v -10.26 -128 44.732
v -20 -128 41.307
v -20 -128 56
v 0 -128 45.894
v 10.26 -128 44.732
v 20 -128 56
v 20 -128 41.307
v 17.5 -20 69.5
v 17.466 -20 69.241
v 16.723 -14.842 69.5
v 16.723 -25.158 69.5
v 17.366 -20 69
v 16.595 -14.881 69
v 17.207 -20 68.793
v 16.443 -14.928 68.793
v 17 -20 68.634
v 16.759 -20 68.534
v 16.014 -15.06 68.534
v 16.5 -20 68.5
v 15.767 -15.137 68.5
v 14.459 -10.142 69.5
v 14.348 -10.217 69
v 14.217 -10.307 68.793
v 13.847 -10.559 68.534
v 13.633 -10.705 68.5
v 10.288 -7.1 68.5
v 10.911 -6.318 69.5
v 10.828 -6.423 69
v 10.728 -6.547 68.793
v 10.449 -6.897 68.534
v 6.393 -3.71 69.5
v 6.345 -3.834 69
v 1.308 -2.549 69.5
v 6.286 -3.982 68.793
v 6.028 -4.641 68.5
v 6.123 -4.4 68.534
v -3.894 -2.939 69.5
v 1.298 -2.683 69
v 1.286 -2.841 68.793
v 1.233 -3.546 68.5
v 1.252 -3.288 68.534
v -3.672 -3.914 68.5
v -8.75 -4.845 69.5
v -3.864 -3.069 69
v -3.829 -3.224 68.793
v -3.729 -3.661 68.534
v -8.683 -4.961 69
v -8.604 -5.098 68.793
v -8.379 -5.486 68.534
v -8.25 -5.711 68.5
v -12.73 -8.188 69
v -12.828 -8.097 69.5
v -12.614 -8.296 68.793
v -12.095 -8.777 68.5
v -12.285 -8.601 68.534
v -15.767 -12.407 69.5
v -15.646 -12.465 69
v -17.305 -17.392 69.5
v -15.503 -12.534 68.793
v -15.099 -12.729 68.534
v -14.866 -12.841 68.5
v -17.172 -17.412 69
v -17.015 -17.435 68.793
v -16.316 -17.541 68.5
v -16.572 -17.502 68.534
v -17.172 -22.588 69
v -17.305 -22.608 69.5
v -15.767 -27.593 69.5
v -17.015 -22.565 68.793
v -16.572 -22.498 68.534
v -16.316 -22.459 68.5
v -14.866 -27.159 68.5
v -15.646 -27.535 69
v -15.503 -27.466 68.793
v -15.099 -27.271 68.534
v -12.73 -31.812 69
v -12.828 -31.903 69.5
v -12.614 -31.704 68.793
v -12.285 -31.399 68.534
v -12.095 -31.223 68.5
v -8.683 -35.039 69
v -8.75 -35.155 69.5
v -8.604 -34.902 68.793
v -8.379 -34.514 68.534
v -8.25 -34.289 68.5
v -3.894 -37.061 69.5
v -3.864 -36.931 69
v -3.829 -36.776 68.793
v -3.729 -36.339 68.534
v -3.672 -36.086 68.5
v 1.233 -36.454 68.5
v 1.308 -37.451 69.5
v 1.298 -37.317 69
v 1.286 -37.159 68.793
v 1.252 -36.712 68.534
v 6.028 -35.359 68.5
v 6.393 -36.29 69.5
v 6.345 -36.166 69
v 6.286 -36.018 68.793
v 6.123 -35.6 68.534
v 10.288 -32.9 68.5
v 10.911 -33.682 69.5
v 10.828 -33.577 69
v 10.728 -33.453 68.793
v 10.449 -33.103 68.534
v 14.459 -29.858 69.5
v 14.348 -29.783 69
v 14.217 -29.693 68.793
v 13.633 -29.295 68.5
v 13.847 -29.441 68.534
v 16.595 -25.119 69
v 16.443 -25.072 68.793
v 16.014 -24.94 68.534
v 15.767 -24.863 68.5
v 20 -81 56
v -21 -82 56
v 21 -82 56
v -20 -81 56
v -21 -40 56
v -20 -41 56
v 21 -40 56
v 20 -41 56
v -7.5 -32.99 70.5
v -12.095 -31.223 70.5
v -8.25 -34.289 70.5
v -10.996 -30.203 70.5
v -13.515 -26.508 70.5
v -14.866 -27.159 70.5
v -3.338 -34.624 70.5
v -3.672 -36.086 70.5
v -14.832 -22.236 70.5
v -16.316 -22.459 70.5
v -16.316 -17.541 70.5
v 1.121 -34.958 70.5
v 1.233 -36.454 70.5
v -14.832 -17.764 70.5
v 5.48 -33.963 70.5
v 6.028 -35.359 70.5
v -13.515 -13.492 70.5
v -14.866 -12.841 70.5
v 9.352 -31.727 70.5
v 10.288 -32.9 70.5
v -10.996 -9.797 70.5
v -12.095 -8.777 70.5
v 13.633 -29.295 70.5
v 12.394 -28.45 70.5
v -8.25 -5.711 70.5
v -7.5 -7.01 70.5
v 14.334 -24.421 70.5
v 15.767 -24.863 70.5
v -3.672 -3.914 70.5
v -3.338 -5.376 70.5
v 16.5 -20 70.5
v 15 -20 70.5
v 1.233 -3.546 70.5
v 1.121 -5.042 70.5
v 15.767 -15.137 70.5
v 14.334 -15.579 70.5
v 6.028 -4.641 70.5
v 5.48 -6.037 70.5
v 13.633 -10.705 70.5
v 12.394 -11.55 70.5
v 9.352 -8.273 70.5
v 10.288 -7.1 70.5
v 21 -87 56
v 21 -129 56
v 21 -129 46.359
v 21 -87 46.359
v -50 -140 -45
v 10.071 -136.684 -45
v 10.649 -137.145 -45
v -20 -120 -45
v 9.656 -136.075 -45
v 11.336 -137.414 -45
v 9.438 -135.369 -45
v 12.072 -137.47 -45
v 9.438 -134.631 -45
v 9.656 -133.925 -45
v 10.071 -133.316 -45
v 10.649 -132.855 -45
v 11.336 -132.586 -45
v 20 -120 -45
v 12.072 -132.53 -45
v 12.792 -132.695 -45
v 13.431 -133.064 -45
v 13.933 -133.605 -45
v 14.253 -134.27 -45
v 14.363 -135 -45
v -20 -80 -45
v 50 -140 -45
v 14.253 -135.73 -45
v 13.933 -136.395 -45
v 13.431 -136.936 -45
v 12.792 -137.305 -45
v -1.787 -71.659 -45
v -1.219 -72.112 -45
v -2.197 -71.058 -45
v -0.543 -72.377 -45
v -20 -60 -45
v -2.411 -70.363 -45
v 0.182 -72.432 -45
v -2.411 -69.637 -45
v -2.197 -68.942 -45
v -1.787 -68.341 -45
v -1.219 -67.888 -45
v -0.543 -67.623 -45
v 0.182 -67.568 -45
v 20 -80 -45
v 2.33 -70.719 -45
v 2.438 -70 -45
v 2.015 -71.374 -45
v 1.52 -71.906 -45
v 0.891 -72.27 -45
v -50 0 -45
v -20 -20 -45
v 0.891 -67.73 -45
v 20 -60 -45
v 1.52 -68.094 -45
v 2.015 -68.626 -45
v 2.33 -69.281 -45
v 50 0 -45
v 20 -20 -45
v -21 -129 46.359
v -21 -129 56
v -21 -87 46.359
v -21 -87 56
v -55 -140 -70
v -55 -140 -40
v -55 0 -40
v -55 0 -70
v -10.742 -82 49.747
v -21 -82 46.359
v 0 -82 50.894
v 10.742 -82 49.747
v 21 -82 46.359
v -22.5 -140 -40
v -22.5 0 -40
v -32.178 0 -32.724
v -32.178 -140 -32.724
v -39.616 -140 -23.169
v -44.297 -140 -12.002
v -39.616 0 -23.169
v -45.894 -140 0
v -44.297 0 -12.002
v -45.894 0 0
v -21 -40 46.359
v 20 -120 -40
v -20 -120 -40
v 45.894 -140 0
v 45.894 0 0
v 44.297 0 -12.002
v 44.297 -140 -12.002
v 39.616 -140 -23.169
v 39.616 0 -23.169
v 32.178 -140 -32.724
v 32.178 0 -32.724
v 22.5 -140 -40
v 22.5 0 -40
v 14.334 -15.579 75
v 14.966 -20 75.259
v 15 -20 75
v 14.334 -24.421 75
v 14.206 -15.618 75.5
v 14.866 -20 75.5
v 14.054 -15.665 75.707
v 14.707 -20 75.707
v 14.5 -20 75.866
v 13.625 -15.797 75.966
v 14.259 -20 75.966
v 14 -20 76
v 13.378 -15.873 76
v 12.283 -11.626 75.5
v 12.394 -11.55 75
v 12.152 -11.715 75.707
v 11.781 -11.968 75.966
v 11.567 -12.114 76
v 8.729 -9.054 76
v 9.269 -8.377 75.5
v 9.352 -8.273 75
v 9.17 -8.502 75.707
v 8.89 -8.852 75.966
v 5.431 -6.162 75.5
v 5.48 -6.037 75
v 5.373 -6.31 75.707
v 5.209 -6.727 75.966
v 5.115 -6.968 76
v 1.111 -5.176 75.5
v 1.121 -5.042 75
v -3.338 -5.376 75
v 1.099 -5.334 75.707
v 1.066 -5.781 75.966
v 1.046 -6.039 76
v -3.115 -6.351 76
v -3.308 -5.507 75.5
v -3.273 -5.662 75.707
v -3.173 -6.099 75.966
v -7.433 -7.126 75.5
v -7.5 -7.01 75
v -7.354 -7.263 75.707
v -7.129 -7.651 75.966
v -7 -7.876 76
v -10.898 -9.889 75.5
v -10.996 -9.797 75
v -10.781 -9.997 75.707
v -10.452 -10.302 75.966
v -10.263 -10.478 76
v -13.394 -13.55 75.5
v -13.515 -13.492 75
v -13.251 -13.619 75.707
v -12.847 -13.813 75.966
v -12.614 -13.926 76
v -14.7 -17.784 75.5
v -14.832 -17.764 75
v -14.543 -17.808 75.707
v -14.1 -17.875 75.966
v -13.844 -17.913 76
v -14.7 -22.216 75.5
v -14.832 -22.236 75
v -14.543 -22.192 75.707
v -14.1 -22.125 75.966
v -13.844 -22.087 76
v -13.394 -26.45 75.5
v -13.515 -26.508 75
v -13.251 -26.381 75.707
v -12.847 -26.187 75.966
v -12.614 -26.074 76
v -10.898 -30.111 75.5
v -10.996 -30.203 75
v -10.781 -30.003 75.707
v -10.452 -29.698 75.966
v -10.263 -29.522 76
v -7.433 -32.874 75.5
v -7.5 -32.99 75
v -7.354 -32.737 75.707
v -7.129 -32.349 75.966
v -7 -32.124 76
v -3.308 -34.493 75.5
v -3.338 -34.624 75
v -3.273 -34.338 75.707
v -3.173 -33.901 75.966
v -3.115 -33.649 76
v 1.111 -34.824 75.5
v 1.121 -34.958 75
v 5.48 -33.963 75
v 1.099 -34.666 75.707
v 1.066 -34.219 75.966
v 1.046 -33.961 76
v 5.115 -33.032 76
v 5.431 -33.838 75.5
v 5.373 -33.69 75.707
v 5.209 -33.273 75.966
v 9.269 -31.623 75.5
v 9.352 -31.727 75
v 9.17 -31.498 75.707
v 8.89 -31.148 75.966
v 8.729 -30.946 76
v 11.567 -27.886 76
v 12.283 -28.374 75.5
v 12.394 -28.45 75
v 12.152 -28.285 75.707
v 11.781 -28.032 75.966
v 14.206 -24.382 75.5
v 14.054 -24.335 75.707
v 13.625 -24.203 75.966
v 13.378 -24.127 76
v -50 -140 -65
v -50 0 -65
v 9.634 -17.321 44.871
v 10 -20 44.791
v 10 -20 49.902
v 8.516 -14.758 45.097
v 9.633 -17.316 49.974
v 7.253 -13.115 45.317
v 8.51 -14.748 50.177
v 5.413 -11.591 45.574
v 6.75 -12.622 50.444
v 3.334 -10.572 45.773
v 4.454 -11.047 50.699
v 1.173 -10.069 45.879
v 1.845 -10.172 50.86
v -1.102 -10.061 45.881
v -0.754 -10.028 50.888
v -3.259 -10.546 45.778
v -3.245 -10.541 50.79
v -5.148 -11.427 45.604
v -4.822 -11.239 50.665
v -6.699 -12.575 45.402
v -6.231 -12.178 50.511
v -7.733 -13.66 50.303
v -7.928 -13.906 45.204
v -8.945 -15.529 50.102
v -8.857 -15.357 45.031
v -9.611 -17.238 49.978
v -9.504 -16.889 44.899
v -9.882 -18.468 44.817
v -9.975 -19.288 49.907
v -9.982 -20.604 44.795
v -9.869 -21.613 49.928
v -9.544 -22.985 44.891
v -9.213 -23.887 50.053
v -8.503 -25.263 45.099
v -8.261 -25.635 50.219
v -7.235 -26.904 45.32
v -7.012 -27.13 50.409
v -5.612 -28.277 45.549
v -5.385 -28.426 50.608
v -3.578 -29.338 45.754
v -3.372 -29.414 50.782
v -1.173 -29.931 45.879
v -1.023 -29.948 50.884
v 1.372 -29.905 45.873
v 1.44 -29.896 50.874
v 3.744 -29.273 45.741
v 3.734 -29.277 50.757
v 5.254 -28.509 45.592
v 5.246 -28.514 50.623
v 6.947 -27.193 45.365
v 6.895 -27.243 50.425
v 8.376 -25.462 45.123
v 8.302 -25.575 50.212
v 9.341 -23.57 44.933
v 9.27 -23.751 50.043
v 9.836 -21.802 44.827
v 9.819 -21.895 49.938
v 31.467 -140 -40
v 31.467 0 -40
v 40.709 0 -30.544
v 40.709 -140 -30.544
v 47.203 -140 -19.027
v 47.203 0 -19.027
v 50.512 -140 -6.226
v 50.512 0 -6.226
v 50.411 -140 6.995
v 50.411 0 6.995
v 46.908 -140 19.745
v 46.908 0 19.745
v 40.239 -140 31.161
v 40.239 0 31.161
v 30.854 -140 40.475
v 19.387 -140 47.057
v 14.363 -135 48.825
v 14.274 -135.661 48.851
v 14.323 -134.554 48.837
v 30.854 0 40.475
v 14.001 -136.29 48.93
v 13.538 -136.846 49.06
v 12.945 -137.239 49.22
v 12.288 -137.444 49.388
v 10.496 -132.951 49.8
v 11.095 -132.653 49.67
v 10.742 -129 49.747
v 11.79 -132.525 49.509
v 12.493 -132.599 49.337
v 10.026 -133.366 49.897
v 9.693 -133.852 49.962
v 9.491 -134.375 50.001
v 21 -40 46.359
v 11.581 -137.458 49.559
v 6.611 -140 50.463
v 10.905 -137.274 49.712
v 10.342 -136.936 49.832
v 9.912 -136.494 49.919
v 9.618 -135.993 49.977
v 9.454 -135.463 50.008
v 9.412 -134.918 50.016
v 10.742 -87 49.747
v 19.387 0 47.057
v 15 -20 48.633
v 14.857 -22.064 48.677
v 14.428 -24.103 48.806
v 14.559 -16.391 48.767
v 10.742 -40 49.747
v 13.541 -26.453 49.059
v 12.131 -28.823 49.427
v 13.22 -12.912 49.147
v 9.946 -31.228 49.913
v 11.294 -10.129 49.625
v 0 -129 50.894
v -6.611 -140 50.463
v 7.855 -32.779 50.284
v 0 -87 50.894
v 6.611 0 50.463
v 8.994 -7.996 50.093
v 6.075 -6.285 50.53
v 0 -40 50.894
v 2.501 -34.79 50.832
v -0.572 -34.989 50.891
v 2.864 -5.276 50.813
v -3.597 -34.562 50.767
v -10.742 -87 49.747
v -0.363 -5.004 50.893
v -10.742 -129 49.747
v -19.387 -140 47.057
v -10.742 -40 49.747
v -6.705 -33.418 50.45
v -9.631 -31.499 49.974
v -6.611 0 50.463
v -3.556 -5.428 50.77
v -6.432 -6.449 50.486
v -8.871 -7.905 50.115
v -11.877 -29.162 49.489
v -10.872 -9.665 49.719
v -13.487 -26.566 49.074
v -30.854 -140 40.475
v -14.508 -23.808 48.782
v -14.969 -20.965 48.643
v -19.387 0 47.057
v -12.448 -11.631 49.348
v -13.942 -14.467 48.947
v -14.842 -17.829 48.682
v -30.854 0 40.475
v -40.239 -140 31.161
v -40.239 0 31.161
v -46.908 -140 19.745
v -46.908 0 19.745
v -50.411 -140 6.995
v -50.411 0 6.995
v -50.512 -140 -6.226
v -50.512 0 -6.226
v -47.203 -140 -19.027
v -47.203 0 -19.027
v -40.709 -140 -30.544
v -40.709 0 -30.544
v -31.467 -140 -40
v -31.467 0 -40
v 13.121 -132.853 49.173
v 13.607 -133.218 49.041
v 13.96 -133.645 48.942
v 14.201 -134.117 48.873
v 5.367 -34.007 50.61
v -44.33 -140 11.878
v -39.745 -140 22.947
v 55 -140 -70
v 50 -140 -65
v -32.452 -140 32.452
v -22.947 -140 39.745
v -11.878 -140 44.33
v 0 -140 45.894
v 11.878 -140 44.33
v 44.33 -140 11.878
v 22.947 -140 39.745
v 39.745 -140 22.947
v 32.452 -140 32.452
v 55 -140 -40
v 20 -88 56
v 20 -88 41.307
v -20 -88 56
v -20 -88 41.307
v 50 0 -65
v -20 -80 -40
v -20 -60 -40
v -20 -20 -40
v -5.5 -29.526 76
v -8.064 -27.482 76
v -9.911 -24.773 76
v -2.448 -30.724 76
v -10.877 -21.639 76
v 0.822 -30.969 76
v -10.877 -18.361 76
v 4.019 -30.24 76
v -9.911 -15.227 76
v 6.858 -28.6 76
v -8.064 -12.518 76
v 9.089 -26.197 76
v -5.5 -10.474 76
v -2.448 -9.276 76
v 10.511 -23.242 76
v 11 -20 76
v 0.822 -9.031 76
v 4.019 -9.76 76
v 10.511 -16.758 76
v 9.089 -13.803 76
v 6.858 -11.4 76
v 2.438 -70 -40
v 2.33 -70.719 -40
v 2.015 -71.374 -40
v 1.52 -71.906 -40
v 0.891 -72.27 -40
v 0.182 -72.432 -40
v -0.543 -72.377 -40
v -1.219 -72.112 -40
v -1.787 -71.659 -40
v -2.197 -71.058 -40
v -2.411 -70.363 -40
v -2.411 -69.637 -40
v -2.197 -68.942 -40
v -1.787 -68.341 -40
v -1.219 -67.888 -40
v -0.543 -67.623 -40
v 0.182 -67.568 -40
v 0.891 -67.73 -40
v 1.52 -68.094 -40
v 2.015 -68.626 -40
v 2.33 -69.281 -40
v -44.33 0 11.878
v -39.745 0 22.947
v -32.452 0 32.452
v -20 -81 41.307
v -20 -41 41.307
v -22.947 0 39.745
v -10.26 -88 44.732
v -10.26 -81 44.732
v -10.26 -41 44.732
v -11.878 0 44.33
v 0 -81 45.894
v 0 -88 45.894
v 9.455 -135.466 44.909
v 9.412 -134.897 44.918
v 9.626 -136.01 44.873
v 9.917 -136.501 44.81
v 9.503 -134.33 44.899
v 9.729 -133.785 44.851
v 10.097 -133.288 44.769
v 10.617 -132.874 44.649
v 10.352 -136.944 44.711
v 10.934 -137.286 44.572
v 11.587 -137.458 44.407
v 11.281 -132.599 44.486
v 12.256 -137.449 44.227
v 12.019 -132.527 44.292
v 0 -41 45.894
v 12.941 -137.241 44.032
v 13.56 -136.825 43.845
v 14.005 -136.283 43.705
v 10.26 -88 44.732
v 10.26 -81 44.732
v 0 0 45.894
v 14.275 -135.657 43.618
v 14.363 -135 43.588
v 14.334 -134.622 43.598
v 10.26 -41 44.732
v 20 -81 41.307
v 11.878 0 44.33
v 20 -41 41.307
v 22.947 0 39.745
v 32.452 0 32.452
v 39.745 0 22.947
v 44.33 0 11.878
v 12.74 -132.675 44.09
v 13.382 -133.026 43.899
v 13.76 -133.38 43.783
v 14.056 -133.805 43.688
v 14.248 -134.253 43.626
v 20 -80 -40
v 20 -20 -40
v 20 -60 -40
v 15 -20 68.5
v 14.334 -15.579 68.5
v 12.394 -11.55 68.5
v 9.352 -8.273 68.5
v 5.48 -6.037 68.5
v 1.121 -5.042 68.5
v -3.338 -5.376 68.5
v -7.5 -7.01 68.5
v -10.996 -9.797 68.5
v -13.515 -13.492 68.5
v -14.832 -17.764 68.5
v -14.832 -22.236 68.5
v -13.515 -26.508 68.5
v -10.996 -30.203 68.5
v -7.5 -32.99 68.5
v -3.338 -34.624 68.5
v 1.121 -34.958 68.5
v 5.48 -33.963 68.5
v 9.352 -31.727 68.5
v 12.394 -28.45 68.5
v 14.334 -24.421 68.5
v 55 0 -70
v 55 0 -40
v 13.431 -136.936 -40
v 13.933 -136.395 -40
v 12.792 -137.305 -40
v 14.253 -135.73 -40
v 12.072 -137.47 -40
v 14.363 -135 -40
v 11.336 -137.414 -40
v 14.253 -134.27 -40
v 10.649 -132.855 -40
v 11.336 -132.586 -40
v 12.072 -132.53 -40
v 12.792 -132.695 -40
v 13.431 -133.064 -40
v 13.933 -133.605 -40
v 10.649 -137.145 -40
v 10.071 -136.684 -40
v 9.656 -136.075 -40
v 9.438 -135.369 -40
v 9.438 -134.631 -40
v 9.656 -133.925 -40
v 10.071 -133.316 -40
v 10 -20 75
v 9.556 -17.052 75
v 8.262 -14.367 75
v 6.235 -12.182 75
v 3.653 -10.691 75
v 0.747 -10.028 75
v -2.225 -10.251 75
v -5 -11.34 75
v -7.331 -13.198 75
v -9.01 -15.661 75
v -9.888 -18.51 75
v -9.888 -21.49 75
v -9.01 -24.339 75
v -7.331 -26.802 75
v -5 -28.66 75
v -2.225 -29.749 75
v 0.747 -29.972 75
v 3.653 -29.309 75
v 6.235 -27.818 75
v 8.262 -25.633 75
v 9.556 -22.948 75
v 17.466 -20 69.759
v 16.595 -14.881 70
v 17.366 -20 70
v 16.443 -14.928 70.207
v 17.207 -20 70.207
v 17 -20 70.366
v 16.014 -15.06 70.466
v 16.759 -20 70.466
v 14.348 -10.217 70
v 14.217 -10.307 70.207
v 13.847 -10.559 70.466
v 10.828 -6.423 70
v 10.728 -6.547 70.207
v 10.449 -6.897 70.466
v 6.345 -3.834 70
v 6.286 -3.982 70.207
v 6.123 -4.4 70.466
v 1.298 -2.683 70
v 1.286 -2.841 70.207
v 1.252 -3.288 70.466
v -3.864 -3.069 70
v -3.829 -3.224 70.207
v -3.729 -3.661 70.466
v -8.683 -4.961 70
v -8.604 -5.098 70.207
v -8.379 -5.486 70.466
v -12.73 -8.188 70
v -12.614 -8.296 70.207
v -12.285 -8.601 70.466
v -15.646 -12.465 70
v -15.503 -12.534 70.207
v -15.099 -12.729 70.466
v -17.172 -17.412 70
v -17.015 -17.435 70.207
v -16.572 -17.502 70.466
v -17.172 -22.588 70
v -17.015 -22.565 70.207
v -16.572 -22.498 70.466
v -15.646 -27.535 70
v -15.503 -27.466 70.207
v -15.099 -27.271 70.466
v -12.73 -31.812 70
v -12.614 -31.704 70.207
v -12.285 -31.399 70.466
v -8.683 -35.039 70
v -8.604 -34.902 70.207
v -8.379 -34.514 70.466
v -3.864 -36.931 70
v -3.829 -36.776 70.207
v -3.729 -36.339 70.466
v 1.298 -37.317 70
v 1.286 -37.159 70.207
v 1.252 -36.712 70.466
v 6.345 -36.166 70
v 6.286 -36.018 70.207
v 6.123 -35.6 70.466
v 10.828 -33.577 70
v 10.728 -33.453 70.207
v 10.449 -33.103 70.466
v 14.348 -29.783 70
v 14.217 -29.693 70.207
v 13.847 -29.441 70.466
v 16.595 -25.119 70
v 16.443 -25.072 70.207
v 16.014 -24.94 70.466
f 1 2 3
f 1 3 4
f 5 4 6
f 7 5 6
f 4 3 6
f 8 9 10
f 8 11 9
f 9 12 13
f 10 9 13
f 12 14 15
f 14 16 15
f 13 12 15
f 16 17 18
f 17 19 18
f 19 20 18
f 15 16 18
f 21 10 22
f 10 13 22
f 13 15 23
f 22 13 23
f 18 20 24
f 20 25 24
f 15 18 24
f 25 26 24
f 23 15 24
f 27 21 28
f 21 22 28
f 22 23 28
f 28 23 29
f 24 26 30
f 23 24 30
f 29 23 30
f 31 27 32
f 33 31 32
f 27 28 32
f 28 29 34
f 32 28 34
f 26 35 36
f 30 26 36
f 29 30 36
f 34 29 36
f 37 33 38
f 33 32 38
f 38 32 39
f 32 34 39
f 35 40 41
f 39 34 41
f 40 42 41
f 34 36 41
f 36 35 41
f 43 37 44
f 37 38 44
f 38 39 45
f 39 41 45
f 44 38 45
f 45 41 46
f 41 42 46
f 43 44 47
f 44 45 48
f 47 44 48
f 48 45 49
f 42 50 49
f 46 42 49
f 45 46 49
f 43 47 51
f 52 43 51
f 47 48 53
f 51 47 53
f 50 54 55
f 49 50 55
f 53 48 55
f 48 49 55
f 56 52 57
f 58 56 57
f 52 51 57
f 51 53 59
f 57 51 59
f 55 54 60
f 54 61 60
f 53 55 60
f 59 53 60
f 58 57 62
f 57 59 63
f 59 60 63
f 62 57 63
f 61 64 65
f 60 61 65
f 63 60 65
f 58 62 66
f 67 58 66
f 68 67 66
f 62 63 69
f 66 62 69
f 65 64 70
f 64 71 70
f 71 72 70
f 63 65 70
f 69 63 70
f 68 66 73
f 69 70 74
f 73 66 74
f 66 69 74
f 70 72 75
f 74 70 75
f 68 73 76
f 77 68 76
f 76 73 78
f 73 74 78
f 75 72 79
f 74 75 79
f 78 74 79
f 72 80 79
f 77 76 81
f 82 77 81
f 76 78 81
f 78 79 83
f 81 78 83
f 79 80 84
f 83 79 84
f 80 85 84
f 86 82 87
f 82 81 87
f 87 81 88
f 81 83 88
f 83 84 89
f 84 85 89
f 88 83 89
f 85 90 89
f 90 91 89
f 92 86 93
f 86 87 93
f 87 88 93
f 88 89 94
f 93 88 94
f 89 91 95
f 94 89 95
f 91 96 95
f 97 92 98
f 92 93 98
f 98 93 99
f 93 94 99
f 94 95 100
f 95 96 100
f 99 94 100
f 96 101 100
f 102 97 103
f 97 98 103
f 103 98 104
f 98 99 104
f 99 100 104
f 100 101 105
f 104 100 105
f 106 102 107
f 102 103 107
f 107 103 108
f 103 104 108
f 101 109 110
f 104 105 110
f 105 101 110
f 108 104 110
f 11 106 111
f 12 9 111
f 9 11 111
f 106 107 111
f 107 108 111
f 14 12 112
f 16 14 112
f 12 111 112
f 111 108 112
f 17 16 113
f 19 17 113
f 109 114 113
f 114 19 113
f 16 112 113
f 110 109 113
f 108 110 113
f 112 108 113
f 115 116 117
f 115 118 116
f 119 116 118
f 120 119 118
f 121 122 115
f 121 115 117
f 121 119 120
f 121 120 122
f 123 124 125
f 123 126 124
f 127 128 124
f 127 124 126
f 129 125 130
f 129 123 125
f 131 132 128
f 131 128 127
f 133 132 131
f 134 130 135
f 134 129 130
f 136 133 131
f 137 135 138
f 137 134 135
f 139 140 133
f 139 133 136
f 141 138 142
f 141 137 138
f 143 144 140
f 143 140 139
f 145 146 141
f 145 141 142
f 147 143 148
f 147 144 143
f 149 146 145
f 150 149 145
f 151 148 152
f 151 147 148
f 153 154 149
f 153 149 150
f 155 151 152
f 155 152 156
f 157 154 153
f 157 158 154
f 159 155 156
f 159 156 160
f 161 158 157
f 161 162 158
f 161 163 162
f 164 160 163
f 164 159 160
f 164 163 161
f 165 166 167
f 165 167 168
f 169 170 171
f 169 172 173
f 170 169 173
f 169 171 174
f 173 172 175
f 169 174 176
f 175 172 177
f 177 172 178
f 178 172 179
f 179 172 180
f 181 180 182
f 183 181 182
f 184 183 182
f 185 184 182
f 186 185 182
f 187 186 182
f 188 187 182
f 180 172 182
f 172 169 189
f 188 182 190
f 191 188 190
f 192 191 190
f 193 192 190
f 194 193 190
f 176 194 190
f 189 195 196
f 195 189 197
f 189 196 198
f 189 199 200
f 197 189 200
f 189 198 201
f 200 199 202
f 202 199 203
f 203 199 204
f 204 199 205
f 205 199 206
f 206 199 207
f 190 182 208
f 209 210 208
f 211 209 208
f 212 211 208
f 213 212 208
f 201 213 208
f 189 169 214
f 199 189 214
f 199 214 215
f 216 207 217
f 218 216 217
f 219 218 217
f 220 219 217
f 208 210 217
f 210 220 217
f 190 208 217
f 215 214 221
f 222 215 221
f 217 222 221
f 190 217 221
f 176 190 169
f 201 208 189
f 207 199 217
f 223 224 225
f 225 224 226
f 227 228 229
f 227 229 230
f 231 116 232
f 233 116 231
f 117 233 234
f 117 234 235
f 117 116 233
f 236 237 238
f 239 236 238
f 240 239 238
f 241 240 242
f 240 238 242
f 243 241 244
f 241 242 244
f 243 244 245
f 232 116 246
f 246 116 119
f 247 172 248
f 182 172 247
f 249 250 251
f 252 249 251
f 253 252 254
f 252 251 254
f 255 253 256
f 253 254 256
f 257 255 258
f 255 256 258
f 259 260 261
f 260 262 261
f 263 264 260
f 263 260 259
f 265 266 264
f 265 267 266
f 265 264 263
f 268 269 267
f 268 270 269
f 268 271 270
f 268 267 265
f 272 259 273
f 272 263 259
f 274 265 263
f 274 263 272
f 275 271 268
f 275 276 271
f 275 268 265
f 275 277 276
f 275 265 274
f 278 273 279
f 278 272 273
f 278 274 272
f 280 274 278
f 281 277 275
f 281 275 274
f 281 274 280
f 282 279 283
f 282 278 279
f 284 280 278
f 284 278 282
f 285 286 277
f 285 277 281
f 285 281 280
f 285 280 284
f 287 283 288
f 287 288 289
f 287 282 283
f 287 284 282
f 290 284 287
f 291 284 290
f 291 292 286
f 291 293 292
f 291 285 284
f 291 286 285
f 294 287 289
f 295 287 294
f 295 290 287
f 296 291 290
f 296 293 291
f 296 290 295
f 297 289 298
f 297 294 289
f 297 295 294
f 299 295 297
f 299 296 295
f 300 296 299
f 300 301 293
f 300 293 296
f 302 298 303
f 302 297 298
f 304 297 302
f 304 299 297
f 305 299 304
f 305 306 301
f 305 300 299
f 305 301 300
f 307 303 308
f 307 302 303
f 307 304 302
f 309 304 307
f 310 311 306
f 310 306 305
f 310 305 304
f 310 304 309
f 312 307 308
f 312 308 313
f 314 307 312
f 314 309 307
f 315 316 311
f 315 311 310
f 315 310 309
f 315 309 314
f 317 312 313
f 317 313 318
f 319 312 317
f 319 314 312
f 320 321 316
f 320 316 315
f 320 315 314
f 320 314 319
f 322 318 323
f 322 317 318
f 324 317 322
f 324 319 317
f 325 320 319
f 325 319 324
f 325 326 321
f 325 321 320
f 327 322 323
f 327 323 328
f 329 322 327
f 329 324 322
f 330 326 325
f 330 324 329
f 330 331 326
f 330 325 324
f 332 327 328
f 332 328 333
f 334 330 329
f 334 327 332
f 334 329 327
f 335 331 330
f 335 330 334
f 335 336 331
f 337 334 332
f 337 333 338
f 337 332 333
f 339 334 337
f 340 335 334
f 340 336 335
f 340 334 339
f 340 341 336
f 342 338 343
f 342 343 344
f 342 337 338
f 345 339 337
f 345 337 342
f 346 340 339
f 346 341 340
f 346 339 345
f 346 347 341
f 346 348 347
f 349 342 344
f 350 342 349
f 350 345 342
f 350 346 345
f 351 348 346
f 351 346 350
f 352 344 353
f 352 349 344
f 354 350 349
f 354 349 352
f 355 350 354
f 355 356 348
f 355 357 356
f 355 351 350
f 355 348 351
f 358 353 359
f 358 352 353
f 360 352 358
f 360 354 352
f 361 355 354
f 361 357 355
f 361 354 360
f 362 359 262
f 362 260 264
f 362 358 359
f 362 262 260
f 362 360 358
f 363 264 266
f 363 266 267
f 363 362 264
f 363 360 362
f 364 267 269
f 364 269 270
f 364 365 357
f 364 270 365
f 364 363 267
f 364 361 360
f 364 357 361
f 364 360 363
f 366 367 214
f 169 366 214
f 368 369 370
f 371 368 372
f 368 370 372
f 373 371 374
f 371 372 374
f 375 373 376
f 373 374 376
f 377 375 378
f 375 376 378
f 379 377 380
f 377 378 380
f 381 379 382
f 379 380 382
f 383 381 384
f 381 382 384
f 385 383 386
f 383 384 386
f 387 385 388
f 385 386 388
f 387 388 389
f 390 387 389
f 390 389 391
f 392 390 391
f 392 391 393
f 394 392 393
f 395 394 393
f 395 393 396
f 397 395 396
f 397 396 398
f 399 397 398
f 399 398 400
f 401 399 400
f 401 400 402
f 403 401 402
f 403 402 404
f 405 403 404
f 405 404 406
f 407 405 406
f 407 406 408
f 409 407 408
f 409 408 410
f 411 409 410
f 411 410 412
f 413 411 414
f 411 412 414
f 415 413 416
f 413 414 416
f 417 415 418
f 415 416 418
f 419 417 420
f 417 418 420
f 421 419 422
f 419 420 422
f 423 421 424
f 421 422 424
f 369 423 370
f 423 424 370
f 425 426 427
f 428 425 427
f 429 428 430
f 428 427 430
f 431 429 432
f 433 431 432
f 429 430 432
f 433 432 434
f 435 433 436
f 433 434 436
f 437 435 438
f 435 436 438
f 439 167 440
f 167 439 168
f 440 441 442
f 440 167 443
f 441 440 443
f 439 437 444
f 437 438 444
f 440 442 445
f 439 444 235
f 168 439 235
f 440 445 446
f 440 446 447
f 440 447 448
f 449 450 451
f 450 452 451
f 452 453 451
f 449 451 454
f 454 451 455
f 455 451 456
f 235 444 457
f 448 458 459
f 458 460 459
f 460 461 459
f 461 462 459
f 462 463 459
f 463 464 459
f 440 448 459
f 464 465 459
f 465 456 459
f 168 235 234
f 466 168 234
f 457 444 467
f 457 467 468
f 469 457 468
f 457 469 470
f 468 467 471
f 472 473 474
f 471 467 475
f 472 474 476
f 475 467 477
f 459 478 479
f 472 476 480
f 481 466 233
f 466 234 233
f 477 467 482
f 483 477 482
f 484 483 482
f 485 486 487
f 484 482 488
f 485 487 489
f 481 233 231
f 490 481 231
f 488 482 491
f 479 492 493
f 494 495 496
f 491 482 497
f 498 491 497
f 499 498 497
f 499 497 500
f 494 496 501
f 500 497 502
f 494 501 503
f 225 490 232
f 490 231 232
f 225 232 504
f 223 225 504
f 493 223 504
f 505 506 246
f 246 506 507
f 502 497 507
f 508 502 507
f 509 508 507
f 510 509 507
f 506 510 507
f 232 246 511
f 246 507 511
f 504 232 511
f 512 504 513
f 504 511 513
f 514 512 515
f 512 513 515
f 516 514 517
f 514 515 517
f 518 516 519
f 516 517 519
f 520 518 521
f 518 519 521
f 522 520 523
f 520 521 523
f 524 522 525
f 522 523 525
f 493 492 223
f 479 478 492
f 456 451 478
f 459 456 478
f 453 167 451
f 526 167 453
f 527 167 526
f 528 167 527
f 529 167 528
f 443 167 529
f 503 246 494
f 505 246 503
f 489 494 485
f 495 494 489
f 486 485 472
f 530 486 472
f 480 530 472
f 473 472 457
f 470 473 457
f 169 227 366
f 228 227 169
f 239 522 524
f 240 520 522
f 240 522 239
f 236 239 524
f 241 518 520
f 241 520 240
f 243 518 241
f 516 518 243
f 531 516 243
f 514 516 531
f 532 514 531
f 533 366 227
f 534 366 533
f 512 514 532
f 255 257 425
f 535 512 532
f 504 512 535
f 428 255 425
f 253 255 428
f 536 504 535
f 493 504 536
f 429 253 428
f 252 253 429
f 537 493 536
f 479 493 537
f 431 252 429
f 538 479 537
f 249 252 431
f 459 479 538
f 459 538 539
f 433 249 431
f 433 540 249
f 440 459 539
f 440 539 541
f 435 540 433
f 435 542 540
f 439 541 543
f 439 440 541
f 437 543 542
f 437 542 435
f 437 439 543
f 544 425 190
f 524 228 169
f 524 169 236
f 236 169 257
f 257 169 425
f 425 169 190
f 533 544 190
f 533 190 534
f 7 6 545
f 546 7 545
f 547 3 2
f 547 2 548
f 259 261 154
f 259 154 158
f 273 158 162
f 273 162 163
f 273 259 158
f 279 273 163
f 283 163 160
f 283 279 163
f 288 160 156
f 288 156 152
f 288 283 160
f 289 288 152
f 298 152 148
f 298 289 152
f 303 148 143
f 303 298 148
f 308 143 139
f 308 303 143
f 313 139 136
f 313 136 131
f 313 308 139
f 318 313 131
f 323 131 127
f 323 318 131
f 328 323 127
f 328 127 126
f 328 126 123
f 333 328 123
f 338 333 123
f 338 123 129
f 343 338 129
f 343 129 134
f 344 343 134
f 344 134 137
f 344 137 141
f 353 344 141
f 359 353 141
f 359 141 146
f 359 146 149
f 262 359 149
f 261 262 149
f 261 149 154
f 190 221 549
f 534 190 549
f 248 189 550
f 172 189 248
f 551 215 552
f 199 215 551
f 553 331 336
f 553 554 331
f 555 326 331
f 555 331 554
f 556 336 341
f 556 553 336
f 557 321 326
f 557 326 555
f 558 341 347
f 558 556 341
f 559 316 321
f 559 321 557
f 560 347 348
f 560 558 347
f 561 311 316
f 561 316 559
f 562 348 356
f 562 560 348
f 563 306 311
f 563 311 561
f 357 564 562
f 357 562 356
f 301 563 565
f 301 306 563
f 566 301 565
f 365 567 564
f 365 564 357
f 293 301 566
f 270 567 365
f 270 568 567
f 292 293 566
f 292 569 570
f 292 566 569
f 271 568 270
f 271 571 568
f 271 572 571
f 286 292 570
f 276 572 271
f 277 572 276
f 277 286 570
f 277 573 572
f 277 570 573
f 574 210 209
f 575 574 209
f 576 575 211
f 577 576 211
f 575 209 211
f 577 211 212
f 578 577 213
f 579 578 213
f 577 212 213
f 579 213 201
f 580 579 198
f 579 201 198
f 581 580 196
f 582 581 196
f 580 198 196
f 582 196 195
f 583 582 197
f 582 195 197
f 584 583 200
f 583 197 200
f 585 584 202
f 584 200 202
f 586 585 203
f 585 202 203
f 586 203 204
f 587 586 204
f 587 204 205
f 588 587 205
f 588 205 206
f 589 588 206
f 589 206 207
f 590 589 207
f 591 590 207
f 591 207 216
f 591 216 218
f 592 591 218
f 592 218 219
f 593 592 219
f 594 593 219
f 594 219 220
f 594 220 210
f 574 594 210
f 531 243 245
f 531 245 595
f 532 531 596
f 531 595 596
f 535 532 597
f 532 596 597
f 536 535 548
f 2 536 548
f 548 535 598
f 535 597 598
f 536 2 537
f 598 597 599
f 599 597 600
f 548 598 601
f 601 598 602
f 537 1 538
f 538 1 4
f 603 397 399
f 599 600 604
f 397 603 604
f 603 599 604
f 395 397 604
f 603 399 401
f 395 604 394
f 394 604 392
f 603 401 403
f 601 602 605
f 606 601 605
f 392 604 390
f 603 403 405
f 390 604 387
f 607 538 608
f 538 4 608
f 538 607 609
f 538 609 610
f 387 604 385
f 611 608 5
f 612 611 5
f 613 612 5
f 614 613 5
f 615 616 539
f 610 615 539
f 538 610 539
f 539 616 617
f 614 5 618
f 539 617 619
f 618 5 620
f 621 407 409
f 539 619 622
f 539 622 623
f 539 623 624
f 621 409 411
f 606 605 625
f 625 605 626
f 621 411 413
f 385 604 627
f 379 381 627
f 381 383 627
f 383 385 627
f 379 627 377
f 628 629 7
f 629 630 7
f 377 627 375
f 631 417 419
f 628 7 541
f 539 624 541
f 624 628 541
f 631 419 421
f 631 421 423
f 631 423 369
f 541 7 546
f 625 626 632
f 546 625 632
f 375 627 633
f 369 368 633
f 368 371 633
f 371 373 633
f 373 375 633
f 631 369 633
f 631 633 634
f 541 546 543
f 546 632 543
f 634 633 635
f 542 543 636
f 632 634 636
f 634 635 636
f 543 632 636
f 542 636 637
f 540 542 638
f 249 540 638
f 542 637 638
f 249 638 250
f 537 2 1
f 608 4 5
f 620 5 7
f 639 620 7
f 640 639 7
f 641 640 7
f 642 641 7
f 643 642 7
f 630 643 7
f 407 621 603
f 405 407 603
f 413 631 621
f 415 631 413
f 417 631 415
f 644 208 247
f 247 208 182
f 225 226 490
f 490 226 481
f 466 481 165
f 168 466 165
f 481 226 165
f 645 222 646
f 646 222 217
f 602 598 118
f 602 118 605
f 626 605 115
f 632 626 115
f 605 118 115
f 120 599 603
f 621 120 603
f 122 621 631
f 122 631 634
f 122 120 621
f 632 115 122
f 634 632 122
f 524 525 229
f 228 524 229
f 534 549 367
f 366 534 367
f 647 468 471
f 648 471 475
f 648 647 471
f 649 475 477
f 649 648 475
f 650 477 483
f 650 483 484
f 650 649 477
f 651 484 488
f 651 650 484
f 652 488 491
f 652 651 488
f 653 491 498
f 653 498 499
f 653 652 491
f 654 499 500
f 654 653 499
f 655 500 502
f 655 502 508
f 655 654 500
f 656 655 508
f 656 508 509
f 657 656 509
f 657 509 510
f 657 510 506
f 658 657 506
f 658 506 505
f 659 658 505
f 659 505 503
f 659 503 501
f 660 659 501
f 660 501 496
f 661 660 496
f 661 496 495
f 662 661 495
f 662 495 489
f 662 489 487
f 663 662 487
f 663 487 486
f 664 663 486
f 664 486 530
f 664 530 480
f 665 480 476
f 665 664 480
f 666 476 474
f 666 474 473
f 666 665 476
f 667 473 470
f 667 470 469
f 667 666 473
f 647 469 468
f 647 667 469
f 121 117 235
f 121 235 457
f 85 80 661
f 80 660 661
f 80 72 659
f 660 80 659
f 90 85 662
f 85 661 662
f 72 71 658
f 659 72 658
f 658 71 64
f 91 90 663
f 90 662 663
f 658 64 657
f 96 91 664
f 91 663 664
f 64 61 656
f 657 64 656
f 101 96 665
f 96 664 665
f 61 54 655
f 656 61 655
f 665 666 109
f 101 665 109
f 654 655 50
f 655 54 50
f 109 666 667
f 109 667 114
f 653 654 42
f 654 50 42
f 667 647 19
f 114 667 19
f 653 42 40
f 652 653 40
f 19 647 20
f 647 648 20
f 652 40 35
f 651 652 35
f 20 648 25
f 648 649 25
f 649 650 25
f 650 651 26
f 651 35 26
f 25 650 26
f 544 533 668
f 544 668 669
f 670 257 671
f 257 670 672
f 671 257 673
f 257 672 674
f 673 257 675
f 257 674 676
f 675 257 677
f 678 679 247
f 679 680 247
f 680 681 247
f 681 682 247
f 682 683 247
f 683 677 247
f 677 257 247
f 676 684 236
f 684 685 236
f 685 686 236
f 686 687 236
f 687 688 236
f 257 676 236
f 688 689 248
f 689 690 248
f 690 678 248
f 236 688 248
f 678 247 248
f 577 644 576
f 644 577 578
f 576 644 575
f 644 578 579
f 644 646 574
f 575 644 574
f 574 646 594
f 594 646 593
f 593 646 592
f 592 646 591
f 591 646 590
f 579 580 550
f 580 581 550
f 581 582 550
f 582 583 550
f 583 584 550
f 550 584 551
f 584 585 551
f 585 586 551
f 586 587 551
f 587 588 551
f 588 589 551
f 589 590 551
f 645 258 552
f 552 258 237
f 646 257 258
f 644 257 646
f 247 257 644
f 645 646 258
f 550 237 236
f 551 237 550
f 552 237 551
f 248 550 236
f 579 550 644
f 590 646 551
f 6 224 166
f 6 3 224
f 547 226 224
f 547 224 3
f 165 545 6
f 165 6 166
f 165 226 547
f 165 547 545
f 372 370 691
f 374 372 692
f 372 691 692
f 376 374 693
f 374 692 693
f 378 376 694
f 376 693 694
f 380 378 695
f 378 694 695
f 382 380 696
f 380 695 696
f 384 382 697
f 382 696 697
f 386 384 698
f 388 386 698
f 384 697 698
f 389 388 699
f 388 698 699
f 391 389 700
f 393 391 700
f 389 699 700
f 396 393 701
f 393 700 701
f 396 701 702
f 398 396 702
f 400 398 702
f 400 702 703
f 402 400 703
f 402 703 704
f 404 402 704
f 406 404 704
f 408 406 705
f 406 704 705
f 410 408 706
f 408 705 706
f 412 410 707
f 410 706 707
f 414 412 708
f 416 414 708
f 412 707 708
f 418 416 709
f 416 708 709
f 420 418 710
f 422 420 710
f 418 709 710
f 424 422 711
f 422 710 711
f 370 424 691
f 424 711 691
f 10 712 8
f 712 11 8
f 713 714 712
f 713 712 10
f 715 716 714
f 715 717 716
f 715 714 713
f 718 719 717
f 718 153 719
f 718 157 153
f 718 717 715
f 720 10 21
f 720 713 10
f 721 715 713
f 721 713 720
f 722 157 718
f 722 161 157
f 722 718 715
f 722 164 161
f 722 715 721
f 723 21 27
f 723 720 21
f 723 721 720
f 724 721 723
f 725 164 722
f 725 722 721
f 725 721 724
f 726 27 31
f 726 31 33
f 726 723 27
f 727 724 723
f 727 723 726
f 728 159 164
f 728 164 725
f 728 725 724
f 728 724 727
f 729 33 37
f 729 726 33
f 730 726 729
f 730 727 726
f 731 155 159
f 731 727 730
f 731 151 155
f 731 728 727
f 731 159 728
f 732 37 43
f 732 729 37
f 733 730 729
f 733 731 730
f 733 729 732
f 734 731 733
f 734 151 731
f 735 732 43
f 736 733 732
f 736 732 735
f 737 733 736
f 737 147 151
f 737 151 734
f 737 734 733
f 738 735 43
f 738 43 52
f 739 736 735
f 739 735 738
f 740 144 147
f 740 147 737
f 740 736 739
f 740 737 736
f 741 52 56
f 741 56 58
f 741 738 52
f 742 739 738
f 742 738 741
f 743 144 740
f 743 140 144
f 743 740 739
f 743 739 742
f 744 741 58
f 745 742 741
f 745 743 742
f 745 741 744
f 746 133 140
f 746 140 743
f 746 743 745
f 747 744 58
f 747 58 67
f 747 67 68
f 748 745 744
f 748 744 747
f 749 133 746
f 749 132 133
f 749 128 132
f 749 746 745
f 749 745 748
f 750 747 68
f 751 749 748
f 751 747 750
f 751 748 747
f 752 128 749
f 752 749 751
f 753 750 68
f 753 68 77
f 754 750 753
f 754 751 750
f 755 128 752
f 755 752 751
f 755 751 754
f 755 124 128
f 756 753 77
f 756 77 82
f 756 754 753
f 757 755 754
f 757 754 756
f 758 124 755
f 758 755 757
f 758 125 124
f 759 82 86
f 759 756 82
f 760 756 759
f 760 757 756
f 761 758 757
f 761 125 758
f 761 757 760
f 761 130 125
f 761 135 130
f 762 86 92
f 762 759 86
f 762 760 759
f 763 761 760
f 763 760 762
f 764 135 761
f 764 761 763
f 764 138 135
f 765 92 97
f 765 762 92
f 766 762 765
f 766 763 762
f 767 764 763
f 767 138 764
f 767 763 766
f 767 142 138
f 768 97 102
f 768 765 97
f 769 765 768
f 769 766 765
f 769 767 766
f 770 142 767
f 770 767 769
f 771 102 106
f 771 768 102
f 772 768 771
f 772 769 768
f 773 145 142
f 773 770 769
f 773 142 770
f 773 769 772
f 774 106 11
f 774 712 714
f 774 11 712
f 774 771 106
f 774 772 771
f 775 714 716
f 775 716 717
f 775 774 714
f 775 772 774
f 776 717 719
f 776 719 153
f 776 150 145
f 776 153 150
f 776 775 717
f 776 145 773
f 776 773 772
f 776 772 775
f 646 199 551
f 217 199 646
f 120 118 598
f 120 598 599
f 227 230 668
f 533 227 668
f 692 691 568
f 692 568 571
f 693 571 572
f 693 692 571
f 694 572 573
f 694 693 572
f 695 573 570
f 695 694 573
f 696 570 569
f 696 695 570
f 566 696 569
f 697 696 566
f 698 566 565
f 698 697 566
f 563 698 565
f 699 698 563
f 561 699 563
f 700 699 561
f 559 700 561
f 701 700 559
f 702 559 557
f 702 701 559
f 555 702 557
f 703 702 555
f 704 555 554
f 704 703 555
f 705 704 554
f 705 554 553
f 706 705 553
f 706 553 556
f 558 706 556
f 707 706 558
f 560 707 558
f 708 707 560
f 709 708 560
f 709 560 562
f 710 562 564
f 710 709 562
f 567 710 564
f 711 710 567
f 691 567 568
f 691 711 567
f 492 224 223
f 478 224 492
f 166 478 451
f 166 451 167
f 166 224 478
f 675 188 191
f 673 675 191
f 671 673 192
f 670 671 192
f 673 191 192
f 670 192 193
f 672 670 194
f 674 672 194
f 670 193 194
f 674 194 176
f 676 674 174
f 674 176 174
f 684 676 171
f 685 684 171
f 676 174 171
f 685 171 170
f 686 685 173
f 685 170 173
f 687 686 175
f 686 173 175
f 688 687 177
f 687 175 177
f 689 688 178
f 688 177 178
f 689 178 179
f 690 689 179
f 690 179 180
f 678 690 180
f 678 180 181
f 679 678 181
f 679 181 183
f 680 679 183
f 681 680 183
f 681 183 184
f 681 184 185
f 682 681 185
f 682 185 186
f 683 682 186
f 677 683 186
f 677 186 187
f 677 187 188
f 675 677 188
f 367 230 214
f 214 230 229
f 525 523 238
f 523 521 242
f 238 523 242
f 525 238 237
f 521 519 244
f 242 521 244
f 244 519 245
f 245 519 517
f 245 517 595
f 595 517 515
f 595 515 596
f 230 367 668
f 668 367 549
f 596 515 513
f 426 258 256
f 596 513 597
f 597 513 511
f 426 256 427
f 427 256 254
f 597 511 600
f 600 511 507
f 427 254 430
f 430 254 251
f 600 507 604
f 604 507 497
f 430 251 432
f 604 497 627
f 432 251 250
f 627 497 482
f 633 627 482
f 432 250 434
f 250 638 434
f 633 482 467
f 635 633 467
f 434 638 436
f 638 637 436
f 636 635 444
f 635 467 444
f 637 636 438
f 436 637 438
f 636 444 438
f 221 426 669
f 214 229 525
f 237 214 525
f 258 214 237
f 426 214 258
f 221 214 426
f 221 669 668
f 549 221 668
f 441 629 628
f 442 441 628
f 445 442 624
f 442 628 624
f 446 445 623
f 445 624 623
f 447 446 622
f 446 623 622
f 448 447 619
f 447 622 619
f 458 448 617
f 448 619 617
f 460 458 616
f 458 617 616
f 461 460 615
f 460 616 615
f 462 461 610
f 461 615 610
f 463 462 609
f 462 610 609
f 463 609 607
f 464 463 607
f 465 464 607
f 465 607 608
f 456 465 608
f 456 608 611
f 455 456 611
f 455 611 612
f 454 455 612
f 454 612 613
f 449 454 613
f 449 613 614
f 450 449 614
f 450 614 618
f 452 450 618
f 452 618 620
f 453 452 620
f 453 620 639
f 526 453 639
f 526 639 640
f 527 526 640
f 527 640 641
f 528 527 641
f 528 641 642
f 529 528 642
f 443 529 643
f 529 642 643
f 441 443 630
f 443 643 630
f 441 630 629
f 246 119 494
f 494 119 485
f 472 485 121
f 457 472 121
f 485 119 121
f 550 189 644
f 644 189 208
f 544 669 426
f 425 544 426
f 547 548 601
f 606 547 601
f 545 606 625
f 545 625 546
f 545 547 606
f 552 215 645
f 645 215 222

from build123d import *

# Parameters (mm, degrees)
F0_W      = 5
F0_H      = 5
F1_DEPTH  = 140
F5_R      = 15
F5_R_2    = 10
F6_DEPTH  = 30
F7_R      = 10
F8_DEPTH  = 25
F7_W      = 42
F7_H      = 42
F7_W_2    = 40
F7_H_2    = 40
F9_DEPTH  = 10
F10_DEPTH = 25
F11_W     = 40
F11_H     = 40
F11_R     = 2.4384
F11_R_2   = 2.4765
F12_DEPTH = 25
F13_DEPTH = 100
F15_R     = 17.5
F15_R_2   = 10
F16_DEPTH = 2
F17_R     = 0.99999
F18_SIZE  = 1


# Not quite as in the source:
# - a fillet or chamfer is up to 0.001 mm smaller than in the source, because OpenCascade refuses the exact size


with BuildPart() as f1:
    # F0 (on Front) → F1 (new body)
    with BuildSketch(Plane.XZ):
        with BuildLine():
            ThreePointArc((-22.5, -40), (-39.6160493738, -23.1693468188), (-45.8938993767, 0))
            Line((-45.8938993767, 0), (-50.8938993767, 0))
            ThreePointArc((-50.8938993767, 0), (-45.7803505669, -22.233949171), (-31.4672686099, -40))
            Line((-31.4672686099, -40), (-22.5, -40))
        make_face()
        with BuildLine():
            ThreePointArc((-9.0138781887, -45), (-15.954031767, -43.0316031583), (-22.5, -40))
            Line((-22.5, -40), (-31.4672686099, -40))
            ThreePointArc((-31.4672686099, -40), (-27.7333960958, -42.6737358894), (-23.7737038294, -45))
            Line((-23.7737038294, -45), (-9.0138781887, -45))
        make_face()
        with BuildLine():
            ThreePointArc((-45.8938993767, 0), (0, 45.8938993767), (45.8938993767, 0))
            Line((45.8938993767, 0), (50.8938993767, 0))
            ThreePointArc((50.8938993767, 0), (0, 50.8938993767), (-50.8938993767, 0))
            Line((-50.8938993767, 0), (-45.8938993767, 0))
        make_face()
        with BuildLine():
            Line((50.8938993767, 0), (45.8938993767, 0))
            ThreePointArc((45.8938993767, 0), (39.6160493738, -23.1693468188), (22.5, -40))
            Line((22.5, -40), (31.4672686099, -40))
            ThreePointArc((31.4672686099, -40), (45.7803505669, -22.233949171), (50.8938993767, 0))
        make_face()
        with Locations((-52.5, -67.5)):
            Rectangle(F0_W, F0_H)
        with BuildLine():
            ThreePointArc((-23.7737038294, -45), (-27.7333960958, -42.6737358894), (-31.4672686099, -40))
            Line((-31.4672686099, -40), (-55, -40))
            Line((-55, -40), (-55, -65))
            Line((-55, -65), (-50, -65))
            Line((-50, -65), (-50, -45))
            Line((-50, -45), (-23.7737038294, -45))
        make_face()
        with BuildLine():
            Line((55, -40), (31.4672686099, -40))
            ThreePointArc((31.4672686099, -40), (27.7333960958, -42.6737358894), (23.7737038294, -45))
            Line((23.7737038294, -45), (50, -45))
            Line((50, -45), (50, -65))
            Line((50, -65), (-50, -65))
            Line((-50, -65), (-50, -70))
            Line((-50, -70), (55, -70))
            Line((55, -70), (55, -40))
        make_face()
        with BuildLine():
            ThreePointArc((9.0138781887, -45), (15.954031767, -43.0316031583), (22.5, -40))
            Line((22.5, -40), (0, -40))
            Line((0, -40), (-22.5, -40))
            ThreePointArc((-22.5, -40), (-15.954031767, -43.0316031583), (-9.0138781887, -45))
            Line((-9.0138781887, -45), (9.0138781887, -45))
        make_face()
        with BuildLine():
            Line((31.4672686099, -40), (22.5, -40))
            ThreePointArc((22.5, -40), (15.954031767, -43.0316031583), (9.0138781887, -45))
            Line((9.0138781887, -45), (23.7737038294, -45))
            ThreePointArc((23.7737038294, -45), (27.7333960958, -42.6737358894), (31.4672686099, -40))
        make_face()
    extrude(amount=F1_DEPTH)

    # F5 (on offset) → F6 (join)
    with BuildSketch(Plane.XY.offset(76)):
        with Locations((0, -20)):
            Circle(F5_R)
        with Locations((0, -20)):
            Circle(F5_R_2, mode=Mode.SUBTRACT)
    extrude(amount=-F6_DEPTH)

    # F7 (on offset) → F8 (cut)
    with BuildSketch(Plane.XY.offset(56)):
        with Locations((0, -20)):
            Circle(F7_R)
    extrude(amount=-F8_DEPTH, mode=Mode.SUBTRACT)

    # F7 (on offset) → F9 (join)
    with BuildSketch(Plane.XY.offset(56)):
        with Locations((0, -61)):
            Rectangle(F7_W, F7_H)
        with Locations((0, -61)):
            Rectangle(F7_W_2, F7_H_2, mode=Mode.SUBTRACT)
        with Locations((0, -108)):
            Rectangle(F7_W, F7_H)
        with Locations((0, -108)):
            Rectangle(F7_W_2, F7_H_2, mode=Mode.SUBTRACT)
    extrude(amount=-F9_DEPTH)

    # F7 (on offset) → F10 (cut)
    with BuildSketch(Plane.XY.offset(56)):
        with Locations((0, -61)):
            Rectangle(F7_W_2, F7_H_2)
        with Locations((0, -108)):
            Rectangle(F7_W_2, F7_H_2)
    extrude(amount=-F10_DEPTH, mode=Mode.SUBTRACT)

    # F11 (on face) → F12 (cut)
    with BuildSketch(Plane(origin=(0, 0, -45), x_dir=(1, 0, 0), z_dir=(0, 0, -1))):
        with Locations((3.8294e-06, 40)):
            Rectangle(F11_W, F11_H)
        with Locations((0, 100)):
            Rectangle(F11_W, F11_H)
        with Locations((0, 70)):
            Circle(F11_R)
        with Locations((11.8868519147, 135)):
            Circle(F11_R_2)
    extrude(amount=-F12_DEPTH, mode=Mode.SUBTRACT)

    # F11 (on face) → F13 (cut)
    with BuildSketch(Plane(origin=(0, 0, -45), x_dir=(1, 0, 0), z_dir=(0, 0, -1))):
        with Locations((11.8868519147, 135)):
            Circle(F11_R_2)
    extrude(amount=-F13_DEPTH, mode=Mode.SUBTRACT)

    # F15 (on offset) → F16 (join)
    with BuildSketch(Plane.XY.offset(68.5)):
        with Locations((0, -20)):
            Circle(F15_R)
        with Locations((0, -20)):
            Circle(F15_R_2, mode=Mode.SUBTRACT)
    extrude(amount=F16_DEPTH)

    # F17 (radius 1 in the source; OpenCascade refuses exactly that, so slightly less here)
    f17_edges = [f1.edges().sort_by_distance(p)[0] for p in [
        (-17.5, -20, 70.5),
        (-17.5, -20, 68.5),
        (-15, -20, 76),
    ]]
    fillet(f17_edges, radius=F17_R)

    # F18
    f18_edges = [f1.edges().sort_by_distance(p)[0] for p in [
        (-10, -20, 76),
    ]]
    chamfer(f18_edges, length=F18_SIZE)


solid = f1.part
